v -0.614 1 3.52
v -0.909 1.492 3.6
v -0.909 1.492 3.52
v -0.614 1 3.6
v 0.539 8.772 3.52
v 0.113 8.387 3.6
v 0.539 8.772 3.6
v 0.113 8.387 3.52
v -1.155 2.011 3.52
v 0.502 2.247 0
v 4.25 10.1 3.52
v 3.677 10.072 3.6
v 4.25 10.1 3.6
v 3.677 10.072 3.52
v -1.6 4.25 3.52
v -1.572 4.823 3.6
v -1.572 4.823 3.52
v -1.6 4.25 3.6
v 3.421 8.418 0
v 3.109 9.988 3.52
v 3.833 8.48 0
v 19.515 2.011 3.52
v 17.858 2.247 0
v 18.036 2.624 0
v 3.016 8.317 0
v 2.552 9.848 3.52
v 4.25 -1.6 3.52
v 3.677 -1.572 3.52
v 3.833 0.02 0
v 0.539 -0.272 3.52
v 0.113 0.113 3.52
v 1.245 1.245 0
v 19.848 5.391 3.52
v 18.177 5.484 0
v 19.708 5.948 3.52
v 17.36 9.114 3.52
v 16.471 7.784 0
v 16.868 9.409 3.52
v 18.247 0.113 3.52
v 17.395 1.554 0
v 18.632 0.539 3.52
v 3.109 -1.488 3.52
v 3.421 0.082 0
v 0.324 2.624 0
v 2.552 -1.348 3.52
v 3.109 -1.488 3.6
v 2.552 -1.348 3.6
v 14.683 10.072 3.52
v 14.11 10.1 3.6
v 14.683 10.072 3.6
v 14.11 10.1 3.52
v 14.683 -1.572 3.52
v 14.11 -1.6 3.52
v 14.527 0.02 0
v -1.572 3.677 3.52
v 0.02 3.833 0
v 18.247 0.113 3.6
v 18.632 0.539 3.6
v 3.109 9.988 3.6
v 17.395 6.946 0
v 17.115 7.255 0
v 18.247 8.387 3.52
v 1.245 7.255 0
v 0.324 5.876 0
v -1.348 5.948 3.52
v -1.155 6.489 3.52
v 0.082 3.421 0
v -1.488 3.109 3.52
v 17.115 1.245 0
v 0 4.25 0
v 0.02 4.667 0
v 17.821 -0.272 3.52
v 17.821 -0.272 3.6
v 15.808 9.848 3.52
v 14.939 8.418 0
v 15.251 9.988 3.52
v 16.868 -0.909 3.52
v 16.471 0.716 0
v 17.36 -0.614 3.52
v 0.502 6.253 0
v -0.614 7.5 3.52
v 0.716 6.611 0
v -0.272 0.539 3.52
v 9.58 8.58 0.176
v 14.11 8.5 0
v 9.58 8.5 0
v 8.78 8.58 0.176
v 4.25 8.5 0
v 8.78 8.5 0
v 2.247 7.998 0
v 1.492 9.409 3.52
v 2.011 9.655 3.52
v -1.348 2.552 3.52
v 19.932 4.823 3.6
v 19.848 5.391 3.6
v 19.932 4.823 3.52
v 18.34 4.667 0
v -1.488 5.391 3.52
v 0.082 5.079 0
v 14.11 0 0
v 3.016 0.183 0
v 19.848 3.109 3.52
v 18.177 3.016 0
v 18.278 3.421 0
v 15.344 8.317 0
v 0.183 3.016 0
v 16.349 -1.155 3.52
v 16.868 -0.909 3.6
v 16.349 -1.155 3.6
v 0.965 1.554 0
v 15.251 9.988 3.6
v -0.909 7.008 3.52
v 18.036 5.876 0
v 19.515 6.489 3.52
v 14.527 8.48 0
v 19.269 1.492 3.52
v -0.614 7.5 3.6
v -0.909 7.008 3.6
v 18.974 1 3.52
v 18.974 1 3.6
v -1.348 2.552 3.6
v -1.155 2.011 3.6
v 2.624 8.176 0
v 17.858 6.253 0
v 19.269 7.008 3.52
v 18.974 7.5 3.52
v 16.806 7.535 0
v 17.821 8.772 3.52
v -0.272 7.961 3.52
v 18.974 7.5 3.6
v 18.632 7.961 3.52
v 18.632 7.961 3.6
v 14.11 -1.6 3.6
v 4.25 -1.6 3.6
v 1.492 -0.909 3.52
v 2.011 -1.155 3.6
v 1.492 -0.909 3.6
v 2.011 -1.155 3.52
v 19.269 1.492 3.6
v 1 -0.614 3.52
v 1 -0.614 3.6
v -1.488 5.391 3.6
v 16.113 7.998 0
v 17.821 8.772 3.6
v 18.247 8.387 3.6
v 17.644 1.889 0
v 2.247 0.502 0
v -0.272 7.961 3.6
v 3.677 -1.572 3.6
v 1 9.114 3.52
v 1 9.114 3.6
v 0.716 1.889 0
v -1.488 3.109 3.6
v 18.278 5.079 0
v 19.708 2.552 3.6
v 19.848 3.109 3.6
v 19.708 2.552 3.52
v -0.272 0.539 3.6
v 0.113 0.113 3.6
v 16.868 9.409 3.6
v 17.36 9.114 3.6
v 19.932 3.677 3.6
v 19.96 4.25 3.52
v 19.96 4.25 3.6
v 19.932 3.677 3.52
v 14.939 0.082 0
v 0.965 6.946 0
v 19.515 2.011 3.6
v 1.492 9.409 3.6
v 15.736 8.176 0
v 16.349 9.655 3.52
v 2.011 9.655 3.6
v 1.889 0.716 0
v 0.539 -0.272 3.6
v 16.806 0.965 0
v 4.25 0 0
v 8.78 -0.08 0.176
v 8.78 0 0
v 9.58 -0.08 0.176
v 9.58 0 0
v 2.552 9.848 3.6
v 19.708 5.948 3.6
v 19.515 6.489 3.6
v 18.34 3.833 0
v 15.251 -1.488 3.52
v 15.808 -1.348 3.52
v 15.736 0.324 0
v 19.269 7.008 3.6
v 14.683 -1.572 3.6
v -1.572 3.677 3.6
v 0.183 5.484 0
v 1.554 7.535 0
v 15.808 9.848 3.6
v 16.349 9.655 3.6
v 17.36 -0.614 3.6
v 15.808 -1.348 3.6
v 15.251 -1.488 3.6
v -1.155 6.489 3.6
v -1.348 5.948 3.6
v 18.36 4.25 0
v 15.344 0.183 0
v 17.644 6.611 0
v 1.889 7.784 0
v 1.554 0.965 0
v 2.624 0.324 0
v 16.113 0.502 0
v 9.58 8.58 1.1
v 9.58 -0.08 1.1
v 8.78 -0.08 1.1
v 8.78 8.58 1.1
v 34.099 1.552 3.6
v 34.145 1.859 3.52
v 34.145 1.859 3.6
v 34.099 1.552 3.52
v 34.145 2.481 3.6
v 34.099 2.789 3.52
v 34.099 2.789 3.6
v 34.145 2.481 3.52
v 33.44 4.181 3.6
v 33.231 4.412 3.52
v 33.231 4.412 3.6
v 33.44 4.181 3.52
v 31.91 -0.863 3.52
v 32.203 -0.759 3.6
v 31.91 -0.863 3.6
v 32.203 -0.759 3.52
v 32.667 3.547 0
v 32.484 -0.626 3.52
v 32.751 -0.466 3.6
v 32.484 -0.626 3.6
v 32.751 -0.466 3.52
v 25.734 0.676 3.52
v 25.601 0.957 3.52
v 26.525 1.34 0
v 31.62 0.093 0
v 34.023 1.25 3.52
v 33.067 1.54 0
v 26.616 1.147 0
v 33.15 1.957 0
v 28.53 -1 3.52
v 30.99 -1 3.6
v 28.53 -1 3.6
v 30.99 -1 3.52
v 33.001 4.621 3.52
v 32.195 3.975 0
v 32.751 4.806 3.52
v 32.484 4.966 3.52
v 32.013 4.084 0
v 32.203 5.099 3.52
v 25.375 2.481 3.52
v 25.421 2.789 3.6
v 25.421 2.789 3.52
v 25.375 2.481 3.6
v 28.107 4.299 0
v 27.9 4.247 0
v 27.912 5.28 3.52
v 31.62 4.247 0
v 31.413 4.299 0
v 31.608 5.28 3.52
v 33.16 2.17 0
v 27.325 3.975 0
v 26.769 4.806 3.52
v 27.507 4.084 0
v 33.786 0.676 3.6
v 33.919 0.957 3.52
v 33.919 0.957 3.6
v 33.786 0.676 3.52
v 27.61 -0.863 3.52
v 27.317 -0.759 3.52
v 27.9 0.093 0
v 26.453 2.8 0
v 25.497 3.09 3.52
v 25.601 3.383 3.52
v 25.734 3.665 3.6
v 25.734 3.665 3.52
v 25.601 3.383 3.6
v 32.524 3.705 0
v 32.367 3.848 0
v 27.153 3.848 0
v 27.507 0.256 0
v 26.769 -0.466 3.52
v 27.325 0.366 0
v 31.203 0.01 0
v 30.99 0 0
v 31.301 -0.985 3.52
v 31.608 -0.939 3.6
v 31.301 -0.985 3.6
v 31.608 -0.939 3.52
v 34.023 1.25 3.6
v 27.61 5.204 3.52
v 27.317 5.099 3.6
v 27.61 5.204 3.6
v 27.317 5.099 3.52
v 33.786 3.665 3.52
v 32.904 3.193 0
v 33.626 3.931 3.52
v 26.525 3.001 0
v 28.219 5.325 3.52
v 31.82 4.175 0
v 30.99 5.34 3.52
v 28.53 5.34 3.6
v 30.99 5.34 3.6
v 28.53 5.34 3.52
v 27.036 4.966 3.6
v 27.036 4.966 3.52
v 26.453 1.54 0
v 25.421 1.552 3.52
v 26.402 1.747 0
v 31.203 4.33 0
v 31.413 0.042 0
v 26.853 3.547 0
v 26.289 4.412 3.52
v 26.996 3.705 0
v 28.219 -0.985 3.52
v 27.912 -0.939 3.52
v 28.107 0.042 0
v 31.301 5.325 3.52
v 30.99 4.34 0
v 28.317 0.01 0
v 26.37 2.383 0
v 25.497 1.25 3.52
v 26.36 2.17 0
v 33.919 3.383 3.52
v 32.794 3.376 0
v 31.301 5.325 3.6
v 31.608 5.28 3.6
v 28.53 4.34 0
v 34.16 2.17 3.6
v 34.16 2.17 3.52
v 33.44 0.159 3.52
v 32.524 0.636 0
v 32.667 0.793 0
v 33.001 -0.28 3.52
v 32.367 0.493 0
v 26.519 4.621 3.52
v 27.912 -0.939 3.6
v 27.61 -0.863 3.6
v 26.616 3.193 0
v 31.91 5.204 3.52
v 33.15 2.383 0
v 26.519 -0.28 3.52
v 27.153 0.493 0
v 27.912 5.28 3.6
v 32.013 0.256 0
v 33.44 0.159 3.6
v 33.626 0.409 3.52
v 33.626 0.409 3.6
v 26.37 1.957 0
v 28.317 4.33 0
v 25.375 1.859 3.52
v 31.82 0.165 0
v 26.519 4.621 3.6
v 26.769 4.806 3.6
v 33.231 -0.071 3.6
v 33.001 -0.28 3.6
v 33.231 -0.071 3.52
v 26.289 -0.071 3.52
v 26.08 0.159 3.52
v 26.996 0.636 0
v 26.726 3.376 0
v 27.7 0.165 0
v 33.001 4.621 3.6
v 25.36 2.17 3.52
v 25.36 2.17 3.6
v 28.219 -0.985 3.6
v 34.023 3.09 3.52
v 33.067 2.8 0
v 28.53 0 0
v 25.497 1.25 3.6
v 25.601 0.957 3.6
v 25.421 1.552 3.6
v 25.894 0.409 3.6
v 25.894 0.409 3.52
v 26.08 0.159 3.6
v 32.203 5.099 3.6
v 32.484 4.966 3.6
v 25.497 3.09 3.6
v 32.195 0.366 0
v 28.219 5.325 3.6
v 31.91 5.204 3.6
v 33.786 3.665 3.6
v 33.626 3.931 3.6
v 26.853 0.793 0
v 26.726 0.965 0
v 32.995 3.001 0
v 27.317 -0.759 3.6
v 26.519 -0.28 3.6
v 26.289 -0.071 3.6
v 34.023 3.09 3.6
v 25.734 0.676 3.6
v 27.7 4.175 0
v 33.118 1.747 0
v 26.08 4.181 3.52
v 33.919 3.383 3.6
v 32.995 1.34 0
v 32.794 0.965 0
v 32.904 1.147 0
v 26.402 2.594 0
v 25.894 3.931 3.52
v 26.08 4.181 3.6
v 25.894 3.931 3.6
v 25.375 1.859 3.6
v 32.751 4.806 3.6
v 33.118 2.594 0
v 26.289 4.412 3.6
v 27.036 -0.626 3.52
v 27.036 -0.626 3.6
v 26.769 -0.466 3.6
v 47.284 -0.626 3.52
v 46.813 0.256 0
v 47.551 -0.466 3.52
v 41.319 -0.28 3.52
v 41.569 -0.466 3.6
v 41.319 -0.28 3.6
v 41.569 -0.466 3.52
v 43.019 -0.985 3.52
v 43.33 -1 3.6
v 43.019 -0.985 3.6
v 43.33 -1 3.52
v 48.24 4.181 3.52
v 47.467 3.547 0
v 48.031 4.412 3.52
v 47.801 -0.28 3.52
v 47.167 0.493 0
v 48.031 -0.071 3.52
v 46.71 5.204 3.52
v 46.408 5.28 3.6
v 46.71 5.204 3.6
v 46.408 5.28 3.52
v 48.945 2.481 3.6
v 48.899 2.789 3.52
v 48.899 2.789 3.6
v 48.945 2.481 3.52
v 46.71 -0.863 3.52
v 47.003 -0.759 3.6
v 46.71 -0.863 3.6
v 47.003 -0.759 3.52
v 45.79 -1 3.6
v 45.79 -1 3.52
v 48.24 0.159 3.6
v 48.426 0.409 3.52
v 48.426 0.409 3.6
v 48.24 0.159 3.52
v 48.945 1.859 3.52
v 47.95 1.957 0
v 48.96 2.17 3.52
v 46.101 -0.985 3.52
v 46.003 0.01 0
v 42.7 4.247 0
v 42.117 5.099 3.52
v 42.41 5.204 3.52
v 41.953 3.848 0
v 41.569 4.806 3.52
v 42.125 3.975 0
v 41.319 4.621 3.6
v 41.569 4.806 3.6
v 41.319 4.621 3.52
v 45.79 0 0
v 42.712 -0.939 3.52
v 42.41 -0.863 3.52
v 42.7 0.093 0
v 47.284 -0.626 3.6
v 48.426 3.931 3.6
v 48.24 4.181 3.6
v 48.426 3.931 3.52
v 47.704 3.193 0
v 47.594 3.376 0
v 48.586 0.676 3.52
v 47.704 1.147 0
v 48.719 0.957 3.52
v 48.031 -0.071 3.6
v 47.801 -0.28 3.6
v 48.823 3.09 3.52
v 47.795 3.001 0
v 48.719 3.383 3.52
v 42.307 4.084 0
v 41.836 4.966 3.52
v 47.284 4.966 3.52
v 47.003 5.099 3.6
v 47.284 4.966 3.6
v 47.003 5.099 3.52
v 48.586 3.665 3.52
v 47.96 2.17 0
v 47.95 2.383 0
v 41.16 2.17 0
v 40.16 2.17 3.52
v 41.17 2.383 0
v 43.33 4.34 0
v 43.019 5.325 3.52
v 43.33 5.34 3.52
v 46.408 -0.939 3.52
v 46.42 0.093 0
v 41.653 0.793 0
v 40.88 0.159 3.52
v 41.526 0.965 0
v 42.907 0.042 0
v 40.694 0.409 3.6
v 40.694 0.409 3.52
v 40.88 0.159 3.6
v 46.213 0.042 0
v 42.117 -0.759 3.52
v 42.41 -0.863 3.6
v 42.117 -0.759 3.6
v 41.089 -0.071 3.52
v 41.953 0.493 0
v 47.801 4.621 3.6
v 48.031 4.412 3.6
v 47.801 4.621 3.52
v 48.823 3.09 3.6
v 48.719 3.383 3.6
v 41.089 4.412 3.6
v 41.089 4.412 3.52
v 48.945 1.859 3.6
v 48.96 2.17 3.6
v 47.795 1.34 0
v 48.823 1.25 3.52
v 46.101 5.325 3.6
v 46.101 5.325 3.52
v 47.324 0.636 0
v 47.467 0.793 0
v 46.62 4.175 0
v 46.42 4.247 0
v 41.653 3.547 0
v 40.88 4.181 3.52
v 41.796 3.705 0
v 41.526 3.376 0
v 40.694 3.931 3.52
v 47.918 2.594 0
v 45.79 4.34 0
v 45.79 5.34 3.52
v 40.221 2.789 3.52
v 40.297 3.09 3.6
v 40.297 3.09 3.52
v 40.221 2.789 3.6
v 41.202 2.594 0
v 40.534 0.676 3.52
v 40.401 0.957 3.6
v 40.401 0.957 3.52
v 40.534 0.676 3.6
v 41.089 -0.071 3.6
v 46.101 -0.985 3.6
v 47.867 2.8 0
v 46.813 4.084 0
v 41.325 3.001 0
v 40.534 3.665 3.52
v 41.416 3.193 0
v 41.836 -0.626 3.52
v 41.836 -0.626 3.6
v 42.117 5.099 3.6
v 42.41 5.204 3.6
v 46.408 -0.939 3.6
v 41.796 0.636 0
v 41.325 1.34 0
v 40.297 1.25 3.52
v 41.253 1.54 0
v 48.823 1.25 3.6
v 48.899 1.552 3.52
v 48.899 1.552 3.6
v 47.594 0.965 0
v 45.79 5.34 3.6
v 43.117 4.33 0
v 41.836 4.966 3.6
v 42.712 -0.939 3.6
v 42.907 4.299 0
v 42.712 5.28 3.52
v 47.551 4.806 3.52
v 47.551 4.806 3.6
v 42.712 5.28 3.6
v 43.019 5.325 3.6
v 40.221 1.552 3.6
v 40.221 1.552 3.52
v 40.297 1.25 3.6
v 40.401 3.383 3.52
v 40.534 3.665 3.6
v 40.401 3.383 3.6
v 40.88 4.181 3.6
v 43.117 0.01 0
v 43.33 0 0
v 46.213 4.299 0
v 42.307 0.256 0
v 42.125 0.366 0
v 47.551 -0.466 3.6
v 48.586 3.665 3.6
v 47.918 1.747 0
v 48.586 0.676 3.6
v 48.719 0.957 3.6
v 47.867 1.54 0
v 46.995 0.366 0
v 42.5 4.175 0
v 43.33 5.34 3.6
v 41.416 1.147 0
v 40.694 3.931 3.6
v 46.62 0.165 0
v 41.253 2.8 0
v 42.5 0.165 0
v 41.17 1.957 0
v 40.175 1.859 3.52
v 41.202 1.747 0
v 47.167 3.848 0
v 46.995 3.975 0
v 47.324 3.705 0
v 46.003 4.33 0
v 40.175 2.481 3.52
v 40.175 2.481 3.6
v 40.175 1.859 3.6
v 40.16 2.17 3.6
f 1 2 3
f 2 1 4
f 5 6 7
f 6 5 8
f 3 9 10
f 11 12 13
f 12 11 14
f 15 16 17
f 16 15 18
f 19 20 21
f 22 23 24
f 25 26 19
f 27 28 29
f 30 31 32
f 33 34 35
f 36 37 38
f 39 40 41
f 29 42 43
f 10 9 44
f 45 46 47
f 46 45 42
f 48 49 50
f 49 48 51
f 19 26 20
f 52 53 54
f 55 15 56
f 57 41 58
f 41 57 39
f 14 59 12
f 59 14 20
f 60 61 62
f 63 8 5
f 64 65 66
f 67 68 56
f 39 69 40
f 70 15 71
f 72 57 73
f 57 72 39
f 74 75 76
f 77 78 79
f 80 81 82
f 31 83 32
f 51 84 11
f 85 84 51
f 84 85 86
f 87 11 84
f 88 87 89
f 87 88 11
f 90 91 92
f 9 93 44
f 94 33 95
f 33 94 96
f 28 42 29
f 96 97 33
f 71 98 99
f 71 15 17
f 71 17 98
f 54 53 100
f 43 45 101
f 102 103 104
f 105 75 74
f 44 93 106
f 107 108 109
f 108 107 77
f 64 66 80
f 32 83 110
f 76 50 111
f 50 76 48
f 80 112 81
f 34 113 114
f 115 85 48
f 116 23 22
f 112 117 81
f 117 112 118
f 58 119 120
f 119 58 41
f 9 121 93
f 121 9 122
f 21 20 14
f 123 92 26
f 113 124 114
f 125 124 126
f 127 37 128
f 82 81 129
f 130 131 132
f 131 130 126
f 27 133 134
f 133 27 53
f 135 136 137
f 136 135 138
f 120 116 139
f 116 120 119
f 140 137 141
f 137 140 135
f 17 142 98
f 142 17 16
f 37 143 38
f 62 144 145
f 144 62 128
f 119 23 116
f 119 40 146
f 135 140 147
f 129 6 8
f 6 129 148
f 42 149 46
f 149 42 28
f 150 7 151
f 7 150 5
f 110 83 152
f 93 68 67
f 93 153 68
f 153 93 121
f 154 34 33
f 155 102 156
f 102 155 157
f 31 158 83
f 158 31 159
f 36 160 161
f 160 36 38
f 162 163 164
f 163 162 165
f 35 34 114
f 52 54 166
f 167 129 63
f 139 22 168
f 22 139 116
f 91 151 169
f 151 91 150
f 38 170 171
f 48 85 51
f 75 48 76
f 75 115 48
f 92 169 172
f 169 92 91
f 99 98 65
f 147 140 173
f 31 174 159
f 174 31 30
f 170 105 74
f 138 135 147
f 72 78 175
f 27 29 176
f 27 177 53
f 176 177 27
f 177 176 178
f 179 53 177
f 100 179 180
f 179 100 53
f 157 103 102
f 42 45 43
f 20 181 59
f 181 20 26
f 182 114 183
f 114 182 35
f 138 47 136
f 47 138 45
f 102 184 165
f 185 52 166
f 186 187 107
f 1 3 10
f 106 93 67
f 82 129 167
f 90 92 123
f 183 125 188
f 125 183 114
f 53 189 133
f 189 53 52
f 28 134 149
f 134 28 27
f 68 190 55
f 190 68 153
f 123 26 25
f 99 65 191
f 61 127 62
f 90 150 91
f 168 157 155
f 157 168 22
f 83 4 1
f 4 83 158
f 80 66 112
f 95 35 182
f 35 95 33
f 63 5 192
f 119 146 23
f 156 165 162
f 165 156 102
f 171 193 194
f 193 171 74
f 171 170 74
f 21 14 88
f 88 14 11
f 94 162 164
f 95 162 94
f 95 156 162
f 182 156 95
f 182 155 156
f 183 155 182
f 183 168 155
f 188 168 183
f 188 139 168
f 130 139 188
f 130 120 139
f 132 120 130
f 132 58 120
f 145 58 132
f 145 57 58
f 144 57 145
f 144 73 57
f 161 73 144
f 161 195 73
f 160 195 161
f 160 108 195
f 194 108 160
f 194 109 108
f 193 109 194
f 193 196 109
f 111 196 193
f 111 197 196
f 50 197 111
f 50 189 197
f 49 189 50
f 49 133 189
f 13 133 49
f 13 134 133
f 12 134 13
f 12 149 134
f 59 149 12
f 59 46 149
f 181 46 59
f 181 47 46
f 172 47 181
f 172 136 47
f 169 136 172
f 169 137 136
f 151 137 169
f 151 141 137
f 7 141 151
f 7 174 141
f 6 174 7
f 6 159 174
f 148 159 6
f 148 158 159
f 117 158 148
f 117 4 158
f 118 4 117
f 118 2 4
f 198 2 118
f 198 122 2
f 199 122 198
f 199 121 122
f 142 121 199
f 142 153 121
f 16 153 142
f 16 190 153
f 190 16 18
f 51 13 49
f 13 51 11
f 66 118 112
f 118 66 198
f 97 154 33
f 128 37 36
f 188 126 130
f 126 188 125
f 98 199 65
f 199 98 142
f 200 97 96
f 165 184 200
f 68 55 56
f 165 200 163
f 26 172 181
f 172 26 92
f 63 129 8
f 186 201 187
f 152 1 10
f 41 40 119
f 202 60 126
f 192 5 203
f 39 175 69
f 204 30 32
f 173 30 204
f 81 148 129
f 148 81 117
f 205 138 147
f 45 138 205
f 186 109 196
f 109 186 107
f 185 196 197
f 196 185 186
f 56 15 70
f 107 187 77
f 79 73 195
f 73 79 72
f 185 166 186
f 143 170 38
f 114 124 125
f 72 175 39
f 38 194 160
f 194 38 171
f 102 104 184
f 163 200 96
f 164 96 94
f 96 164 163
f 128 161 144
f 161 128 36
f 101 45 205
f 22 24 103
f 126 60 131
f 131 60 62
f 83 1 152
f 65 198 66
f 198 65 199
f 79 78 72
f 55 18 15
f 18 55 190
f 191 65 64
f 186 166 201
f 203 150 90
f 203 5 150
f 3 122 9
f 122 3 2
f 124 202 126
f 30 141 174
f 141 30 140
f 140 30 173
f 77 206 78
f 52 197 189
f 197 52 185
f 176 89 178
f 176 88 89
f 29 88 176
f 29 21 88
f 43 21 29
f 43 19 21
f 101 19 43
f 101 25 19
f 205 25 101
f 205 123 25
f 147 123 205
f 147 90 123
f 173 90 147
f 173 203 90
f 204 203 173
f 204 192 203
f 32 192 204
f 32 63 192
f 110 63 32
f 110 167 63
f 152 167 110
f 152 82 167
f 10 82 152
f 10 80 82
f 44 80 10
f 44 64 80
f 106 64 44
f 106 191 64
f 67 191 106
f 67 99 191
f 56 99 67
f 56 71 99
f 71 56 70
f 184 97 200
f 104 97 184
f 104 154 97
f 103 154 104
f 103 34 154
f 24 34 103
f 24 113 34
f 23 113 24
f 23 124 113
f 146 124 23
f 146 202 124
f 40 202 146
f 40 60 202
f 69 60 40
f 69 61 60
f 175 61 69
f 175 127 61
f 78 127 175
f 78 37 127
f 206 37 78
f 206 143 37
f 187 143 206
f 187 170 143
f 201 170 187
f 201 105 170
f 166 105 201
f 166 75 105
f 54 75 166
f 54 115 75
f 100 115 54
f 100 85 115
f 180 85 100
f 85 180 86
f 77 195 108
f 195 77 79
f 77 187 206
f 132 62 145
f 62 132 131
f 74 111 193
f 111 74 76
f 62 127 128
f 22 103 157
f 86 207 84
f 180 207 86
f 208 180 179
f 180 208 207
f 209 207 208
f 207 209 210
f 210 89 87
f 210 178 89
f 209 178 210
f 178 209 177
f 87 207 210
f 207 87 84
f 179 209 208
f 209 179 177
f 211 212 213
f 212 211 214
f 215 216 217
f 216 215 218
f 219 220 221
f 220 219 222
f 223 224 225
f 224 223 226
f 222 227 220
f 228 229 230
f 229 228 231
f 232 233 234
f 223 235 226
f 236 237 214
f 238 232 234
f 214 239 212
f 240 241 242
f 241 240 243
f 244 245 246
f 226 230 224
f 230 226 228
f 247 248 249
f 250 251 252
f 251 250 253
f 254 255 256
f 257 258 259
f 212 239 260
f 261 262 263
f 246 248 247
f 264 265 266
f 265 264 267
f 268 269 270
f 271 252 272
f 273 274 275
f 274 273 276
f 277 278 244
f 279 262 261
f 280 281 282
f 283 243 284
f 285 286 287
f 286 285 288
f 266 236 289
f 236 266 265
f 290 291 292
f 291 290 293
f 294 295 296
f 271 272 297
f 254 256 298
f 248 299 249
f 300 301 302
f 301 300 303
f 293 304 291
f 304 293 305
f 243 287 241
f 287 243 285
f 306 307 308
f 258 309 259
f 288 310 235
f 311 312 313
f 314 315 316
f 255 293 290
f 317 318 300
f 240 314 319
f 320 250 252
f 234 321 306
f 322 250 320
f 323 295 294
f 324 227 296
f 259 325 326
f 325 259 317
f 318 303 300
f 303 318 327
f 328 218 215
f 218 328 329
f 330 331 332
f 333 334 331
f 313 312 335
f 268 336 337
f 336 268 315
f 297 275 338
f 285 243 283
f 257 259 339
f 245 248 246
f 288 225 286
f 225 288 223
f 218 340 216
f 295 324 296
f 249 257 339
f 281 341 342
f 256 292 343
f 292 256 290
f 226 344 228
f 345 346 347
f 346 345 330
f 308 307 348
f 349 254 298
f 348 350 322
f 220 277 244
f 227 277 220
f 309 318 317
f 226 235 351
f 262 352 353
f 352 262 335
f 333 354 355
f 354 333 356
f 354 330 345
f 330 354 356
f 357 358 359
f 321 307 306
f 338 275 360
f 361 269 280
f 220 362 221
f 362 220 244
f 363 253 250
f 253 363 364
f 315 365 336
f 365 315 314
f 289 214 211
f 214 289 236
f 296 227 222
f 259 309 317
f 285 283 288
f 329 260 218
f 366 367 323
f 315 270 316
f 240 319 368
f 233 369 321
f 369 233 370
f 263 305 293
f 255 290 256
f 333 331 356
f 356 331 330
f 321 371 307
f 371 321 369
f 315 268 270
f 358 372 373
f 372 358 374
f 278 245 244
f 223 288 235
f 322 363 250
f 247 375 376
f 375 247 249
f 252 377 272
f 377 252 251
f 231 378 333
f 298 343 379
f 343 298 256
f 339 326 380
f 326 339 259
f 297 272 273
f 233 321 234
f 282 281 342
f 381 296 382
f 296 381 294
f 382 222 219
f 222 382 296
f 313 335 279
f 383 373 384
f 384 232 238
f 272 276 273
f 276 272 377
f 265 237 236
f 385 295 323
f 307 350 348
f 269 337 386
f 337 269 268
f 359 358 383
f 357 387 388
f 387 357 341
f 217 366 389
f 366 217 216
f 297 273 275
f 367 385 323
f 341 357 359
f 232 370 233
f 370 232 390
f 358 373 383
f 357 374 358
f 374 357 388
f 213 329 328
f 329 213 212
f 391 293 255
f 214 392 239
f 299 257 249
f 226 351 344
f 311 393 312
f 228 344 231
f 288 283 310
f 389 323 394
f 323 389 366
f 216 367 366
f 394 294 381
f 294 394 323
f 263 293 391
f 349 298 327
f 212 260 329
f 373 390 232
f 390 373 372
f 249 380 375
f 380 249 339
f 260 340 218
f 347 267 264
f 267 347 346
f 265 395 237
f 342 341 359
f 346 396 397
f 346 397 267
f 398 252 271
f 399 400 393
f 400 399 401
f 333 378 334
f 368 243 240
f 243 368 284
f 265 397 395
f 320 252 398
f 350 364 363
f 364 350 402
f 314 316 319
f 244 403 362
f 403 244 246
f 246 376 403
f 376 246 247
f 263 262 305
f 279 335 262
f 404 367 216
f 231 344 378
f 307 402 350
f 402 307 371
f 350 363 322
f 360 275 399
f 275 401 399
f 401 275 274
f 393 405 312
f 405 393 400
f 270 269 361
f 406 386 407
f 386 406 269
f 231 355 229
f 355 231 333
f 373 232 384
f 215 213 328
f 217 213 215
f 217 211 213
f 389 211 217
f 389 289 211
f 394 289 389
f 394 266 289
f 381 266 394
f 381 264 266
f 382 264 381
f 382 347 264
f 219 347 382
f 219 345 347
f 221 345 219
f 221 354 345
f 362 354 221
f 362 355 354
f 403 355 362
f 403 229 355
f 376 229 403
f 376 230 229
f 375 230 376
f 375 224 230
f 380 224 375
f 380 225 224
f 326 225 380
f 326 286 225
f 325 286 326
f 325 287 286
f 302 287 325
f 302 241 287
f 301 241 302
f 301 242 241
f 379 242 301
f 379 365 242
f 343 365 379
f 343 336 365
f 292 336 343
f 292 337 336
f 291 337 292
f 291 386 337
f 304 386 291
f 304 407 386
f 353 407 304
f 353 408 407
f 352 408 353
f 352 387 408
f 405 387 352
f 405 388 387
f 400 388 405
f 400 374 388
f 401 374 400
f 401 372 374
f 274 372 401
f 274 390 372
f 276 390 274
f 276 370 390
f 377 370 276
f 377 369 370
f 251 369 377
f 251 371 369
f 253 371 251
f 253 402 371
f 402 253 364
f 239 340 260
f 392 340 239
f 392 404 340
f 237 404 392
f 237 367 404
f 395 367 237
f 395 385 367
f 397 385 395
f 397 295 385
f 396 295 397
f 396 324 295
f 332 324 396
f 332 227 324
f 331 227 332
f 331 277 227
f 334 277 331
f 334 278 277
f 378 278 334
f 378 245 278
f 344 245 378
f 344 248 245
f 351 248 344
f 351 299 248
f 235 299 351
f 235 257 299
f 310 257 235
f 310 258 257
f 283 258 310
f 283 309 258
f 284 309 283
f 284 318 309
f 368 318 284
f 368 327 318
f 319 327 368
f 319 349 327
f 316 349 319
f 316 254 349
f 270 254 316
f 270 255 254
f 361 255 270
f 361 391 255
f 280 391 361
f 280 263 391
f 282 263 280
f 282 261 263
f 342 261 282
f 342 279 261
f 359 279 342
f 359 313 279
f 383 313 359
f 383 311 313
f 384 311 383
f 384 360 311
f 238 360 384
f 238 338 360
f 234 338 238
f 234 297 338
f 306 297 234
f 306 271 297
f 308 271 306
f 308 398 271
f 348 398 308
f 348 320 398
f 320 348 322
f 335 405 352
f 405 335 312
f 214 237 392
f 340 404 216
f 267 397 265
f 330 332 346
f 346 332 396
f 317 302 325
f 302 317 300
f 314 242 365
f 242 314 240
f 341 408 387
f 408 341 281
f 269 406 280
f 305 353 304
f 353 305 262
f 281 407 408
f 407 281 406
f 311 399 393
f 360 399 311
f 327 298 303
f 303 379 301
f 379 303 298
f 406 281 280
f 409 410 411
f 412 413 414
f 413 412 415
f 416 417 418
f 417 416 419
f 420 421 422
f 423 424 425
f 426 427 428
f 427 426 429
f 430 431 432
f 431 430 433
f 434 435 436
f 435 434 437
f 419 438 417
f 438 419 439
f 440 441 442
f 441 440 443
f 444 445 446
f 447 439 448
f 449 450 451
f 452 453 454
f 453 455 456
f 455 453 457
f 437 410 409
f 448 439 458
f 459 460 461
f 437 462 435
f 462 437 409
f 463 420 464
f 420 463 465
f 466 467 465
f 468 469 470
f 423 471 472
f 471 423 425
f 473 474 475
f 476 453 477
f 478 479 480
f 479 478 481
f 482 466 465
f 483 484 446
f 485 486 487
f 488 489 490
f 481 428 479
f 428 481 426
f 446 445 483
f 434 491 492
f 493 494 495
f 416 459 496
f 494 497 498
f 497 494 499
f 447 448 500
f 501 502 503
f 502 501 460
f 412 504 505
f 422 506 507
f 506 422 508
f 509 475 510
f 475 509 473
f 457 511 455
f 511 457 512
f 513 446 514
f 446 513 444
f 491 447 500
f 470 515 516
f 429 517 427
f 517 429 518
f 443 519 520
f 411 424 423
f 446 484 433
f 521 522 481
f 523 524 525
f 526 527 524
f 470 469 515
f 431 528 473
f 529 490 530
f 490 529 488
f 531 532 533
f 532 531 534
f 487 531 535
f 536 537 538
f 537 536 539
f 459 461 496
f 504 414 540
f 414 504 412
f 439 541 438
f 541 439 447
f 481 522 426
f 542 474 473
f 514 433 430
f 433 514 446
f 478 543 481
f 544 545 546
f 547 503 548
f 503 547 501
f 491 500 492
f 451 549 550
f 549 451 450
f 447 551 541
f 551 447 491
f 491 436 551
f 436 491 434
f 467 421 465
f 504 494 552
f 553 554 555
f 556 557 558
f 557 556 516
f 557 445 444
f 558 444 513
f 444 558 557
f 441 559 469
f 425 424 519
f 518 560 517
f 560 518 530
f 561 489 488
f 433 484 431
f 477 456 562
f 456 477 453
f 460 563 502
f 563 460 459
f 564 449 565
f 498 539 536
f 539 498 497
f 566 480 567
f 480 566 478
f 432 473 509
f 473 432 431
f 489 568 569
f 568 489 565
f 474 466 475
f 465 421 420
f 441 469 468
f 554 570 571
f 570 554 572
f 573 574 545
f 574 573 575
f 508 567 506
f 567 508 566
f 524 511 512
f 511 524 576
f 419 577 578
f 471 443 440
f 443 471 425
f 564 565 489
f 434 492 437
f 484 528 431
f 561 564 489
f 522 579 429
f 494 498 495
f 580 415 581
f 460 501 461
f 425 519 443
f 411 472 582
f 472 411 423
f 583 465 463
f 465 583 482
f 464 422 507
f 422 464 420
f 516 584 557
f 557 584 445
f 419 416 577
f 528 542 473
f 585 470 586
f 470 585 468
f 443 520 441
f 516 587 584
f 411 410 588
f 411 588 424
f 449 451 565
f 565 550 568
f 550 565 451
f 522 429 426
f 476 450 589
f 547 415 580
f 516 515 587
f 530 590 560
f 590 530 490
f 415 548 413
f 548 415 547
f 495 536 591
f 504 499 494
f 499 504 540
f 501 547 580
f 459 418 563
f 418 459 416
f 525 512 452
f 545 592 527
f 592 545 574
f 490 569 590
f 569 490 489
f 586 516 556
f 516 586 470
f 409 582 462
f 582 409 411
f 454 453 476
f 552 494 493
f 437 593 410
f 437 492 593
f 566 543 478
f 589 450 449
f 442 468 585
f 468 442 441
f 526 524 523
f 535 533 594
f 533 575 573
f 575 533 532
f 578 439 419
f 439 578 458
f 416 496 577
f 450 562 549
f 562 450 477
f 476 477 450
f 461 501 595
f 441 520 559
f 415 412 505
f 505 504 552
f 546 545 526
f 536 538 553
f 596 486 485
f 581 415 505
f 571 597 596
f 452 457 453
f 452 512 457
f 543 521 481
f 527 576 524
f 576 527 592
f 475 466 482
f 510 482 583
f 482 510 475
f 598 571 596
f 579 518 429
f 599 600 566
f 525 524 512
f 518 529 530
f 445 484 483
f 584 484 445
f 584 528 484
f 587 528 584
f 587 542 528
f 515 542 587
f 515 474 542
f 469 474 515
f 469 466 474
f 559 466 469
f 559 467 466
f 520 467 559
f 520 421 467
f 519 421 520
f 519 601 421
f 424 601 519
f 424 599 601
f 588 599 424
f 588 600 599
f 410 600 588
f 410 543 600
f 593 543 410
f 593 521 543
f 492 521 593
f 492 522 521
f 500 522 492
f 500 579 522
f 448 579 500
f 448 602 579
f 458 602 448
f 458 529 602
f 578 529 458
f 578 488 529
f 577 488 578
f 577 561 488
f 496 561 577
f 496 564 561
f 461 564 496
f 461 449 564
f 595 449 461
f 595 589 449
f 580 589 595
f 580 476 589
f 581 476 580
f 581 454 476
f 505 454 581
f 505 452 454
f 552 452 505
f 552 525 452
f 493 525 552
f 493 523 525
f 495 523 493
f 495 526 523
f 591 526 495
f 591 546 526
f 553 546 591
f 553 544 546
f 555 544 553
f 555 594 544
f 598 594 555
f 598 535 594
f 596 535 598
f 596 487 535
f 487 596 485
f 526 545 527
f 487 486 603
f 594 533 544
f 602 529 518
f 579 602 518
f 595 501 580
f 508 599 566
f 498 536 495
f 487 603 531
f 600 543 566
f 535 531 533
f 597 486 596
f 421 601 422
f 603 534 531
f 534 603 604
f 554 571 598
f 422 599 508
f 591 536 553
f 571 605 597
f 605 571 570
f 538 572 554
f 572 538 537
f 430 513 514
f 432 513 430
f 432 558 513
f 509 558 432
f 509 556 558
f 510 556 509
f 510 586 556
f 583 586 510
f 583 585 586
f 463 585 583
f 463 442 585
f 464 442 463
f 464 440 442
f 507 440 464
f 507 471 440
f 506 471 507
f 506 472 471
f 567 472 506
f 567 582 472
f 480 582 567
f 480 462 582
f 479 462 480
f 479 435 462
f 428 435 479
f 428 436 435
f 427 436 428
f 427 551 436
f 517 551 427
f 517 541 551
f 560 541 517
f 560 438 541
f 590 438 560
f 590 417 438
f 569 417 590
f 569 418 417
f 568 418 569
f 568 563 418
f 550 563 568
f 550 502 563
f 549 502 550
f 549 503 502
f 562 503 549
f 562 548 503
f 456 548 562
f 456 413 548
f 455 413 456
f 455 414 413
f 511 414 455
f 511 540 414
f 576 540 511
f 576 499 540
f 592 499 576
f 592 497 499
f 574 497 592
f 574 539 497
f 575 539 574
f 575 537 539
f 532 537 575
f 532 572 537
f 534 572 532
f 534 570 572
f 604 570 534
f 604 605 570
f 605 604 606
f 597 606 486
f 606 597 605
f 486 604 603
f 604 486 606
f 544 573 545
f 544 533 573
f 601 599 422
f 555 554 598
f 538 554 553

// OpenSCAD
// file: face_lock.scad
// AP1 face lock — generated by src/face_spec.py. Do not edit; edit the spec.
style = "ap1";
module_aspect = 2.35;
tach_cx = 0.5;
tach_cy_h = 1.3;
tach_r_out = 0.543;
tach_r_in = 0.51;
tach_r_line = 0.506;
tach_r_num = 0.476;
tach_num_size = 0.034;
tach_a0 = -127.8;
tach_a9 = -52.2;
tach_hatch_deg = 5.5;
crown_cy_h = 1.1926249999999998;
crown_r = 0.5035;
crown_lip = 0.02;
spring_y_h = 0.58;
speed_win = [0.39, 0.3, 0.22, 0.24];
odo_win = [0.39, 0.57, 0.22, 0.13];
temp_win = [0.13, 0.52, 0.16, 0.055];
temp_icon = [0.15, 0.478];
temp_c = [0.108, 0.548];
temp_h = [0.312, 0.548];
temp_underline_y = 0.59;
fuel_win = [0.815, 0.465, 0.11, 0.045];
fuel_icon = [0.905, 0.425];
fuel_e = [0.797, 0.49];
fuel_f = [0.943, 0.49];
fuel_underline_y = 0.525;
side_gauges_arched = false;
arc_lamps = [[0.35, 0.34, 0.022], [0.65, 0.34, 0.022], [0.712, 0.42, 0.02]];
arc_lamp_r = 0.0185;
strip = [0.155, 0.745, 0.75, 0.14];
strip_lamps = [[0.19, 0.815, 0.03], [0.262, 0.815, 0.022], [0.322, 0.815, 0.024], [0.388, 0.815, 0.024], [0.462, 0.815, 0.02], [0.545, 0.815, 0.02], [0.635, 0.815, 0.02], [0.715, 0.815, 0.02], [0.8, 0.815, 0.03]];
panel_left = [0.06, 0.615, 0.185, 0.09];
panel_right = [0.79, 0.59, 0.145, 0.09];
btn_minus = [0.06, 0.815];
btn_plus = [0.118, 0.815];
btn_d = 0.05;
btn_sel = [0.935, 0.745];
btn_trip = [0.978, 0.745];
oval_w = 0.04;
oval_h = 0.06;
cancel_icon = [0.157, 0.935];
cancel_text = [0.172, 0.935];
units_label = [0.9, 0.862];
// file: dims.scad
// =============================================================================
// Dimensions — Option 1 replace-face stack (arc lock)
// =============================================================================
// Face geometry comes from face_lock.scad, generated by src/face_spec.py from
// the same numbers that drive pygame and the web harness. Edit the Python
// spec, re-run `uv run python src/face_spec.py`, never this file's lock values.
//
// Millimetre sizes are ESTIMATED (170 × 72.3, 2.35:1 from
// refs/flat/DIMENSIONS.md). Callipers are UNKNOWN. Every stack thickness is a
// PLACEHOLDER. This is NOT a verified AP1 drop-in.
//
// Origin (OpenSCAD): bottom-left of the module bounding box, Z toward driver.
// The lock uses top-left fractions — convert with X() / Y() / W() / H().
// =============================================================================

include <face_lock.scad>

$fn = 64;
eps = 0.08;

// --- module envelope (ESTIMATED mm) -----------------------------------------
face_w = 170.0;                     // ESTIMATED — TODO measure OEM face width
face_h = face_w / module_aspect;    // 72.3 — TODO measure height

// --- fraction → mm helpers ---------------------------------------------------
function W(f) = f * face_w;                  // width fraction → mm
function H(f) = f * face_h;                  // height fraction → mm
function X(f) = f * face_w;                  // x from the left
function Y(f) = face_h - f * face_h;         // y measured from the TOP → y-up
function Yw(yw) = face_h - yw * face_w;      // width-unit y (arc maths) → y-up
function h_to_w(f) = f / module_aspect;      // height fraction → width units
function rect_mm(r) = [X(r[0]), Y(r[1] + r[3]), W(r[2]), H(r[3])];   // [x, y, w, h] y-up
function pt_mm(a) = [X(a[0]), Y(a[1])];

// Tach / crown circles in mm (y-up). Angles stay screen-space in the lock
// (0° = +x, positive = clockwise on screen) → negate for y-up.
tach_c = [W(tach_cx), Yw(h_to_w(tach_cy_h))];
crown_c = [W(tach_cx), Yw(h_to_w(crown_cy_h))];
function on_circle(c, r_mm, deg_screen) = [c[0] + r_mm * cos(-deg_screen), c[1] + r_mm * sin(-deg_screen)];
function tach_pt(r_frac, deg) = on_circle(tach_c, W(r_frac), deg);
function crown_pt(r_frac, deg) = on_circle(crown_c, W(r_frac), deg);

spring_y = Y(spring_y_h);
// Where the crown circle (radius r, width units) meets the spring line — half-chord in mm.
function crown_half(r_frac) =
    let (dy = crown_c[1] - spring_y)
    sqrt(max(0, W(r_frac) * W(r_frac) - dy * dy));

arc_steps = 72;

// Display windows in the mask, as margins around the lock geometry (mm).
tach_win_margin = 1.2;              // beyond r_out / inside r_num, and past the hatches
tach_win_num_depth = W(0.030);      // window reaches this far inside the numeral radius
min_rim = 1.8;                      // mask rim kept around every window
lcd_win_r = 1.0;                    // corner radius on the LCD windows
gauge_pad = 1.6;                    // TEMP / FUEL window grows to include icon + letters
strip_pad = 0.8;
arc_lamp_hole_clear = 0.25;

// --- 7" panel pocket (Wisecoco-class 16:9 AMOLED; PLACEHOLDER) ---------------
// Active area is centred on the module. It is TALLER than the face (87 > 72.3)
// and NARROWER (154 < 170): every display window sits inside it, the hardware
// buttons at both ends sit over the panel's dead border. Verify against the
// real panel drawing before printing — every number here is a guess.
panel_w = 164.0;                    // PLACEHOLDER module outline
panel_h = 100.0;
panel_t = 2.6;                      // PLACEHOLDER glass + PCB + stiffener
panel_active_w = 154.0;             // PLACEHOLDER
panel_active_h = 87.0;
panel_clear = 0.3;                  // slip around the module
panel_c = [face_w / 2, face_h / 2];
panel_tail_w = 30.0;                // FPC exit — LOCATION UNKNOWN (bottom centre guess)
panel_tail_h = 3.0;

// --- stack thicknesses (ALL PLACEHOLDER / TODO measure) ---------------------
face_t = 2.0;                       // acrylic / printed mask
tray_h = 12.0;                      // overall tray
floor_t = 1.6;                      // tray floor
wall = 2.0;                         // tray wall
face_pocket_clear = 0.35;           // slip around the dropped-in face
diffuser_t = 0.0;                   // AMOLED — no diffuser sheet in this stack
cable_w = 16.0;                     // driver-board cable escape — LOCATION UNKNOWN
cable_h = 4.0;

align_hole_d = 2.3;                 // PLACEHOLDER — do not drill the bay from this

button_clear = 0.40;                // PLACEHOLDER hole oversize
button_cap_t = 2.4;                 // proud cap
button_flange_t = 1.2;              // retention flange
button_flange_extra = 1.6;          // radial flange beyond cap
rocker_groove_w = 0.80;
rocker_groove_d = 1.10;
stem_well_d = 6.0;                  // switch well in the tray — switch UNKNOWN
stem_well_h = 7.0;

// --- derived -----------------------------------------------------------------
web_t = 1.0;                        // baffle web between panel glass and mask
face_rebate_z = tray_h - face_t;
panel_z = face_rebate_z - panel_t - web_t;   // panel glass sits under the web
panel_rect = [panel_c[0] - panel_w / 2, panel_c[1] - panel_h / 2, panel_w, panel_h];
active_rect = [panel_c[0] - panel_active_w / 2, panel_c[1] - panel_active_h / 2, panel_active_w, panel_active_h];

btn_d_mm = W(btn_d);
btn_minus_c = pt_mm(btn_minus);
btn_plus_c = pt_mm(btn_plus);
btn_sel_c = pt_mm(btn_sel);
btn_trip_c = pt_mm(btn_trip);
oval_w_mm = W(oval_w);
oval_h_mm = H(oval_h);
rocker_w = btn_plus_c[0] - btn_minus_c[0] + btn_d_mm;   // −/+ pair as one rocker cap
rocker_h = btn_d_mm;
// file: outline.scad
// =============================================================================
// 2D OEM silhouette + window helpers (replace-face, arc lock)
// =============================================================================
// Same maths as src/face_spec.py / gauge_ui.py hood_outer_points(): the hood
// is a circular crown (crown_c, crown_r) springing from a flat lower bezel;
// the tach is a bar graph on a true circular arc (tach_c, r_out .. r_in).
// All millimetre sizes are still ESTIMATED — see dims.scad.
// =============================================================================

include <dims.scad>

// Points along a circle (mm) between two screen angles.
function arc_pts(c, r_mm, deg0, deg1, n = arc_steps) =
    [for (i = [0 : n]) on_circle(c, r_mm, deg0 + (deg1 - deg0) * i / n)];

// Screen angles where a crown circle of radius r meets the spring line
// (right spring first, sweeping over the top to the left).
function crown_angles(r_frac) =
    let (
        half = crown_half(r_frac),
        dy = crown_c[1] - spring_y             // screen-space dy (spring above centre → negative)
    )
    [atan2(dy, half), atan2(dy, -half)];

// Crown arc in mm from the right spring, over the peak, to the left spring.
function crown_arc(r_frac) =
    let (a = crown_angles(r_frac)) arc_pts(crown_c, W(r_frac), a[0], a[1]);

// Counter-clockwise from bottom-left: flat bottom, up the right side to the
// spring, over the hood crown (crown + lip), down the left side.
function hood_points() =
    let (arc = crown_arc(crown_r + crown_lip))
    concat(
        [[0, 0], [face_w, 0], [face_w, spring_y], arc[0]],
        arc,
        [arc[len(arc) - 1], [0, spring_y]]
    );

// Black face aperture: crown inner edge over the top, full width (minus the
// lip) below the spring.
function aperture_points() =
    let (arc = crown_arc(crown_r), lip = W(crown_lip))
    concat(
        [[face_w - lip, lip], [face_w - lip, spring_y], arc[0]],
        arc,
        [arc[len(arc) - 1], [lip, spring_y], [lip, lip]]
    );

module hood_2d() { polygon(hood_points()); }
module aperture_2d() { polygon(aperture_points()); }

module stadium_2d(w, h) {
    r = min(w, h) / 2;
    hull() {
        translate([r, r]) circle(r = r);
        translate([w - r, r]) circle(r = r);
        translate([r, h - r]) circle(r = r);
        translate([w - r, h - r]) circle(r = r);
    }
}

module rounded_rect_2d(w, h, r) {
    rr = min(r, w / 2, h / 2);
    hull() {
        translate([rr, rr]) circle(r = rr);
        translate([w - rr, rr]) circle(r = rr);
        translate([rr, h - rr]) circle(r = rr);
        translate([w - rr, h - rr]) circle(r = rr);
    }
}

module rect_mm_2d(r, radius = 0) {
    m = rect_mm(r);
    translate([m[0], m[1]]) rounded_rect_2d(m[2], m[3], radius);
}

// Annular sector between two radii (fractions of module width) and two
// screen angles — the display shows the band, ticks and numerals through it.
module sector_2d(r_hi, r_lo, deg0, deg1) {
    outer = arc_pts(tach_c, W(r_hi), deg0, deg1);
    inner = arc_pts(tach_c, W(r_lo), deg1, deg0);
    polygon(concat(outer, inner));
}

// One window from just outside the band's outer edge to just inside the
// numerals, spanning the hatch overrun past 0 and 9.
module tach_window_2d() {
    margin = tach_win_margin / face_w;
    over = tach_hatch_deg + 1.5;
    sector_2d(
        tach_r_out + margin,
        tach_r_num - tach_win_num_depth / face_w,
        tach_a0 - over,
        tach_a9 + over
    );
}

module speed_window_2d() { rect_mm_2d(speed_win, lcd_win_r); }
module odo_window_2d() { rect_mm_2d(odo_win, lcd_win_r); }

// TEMP / FUEL windows include the icon above and the C/H or E/F letters.
module temp_window_2d() {
    icon = pt_mm(temp_icon);
    c = pt_mm(temp_c);
    h = pt_mm(temp_h);
    top = icon[1] + W(0.016);
    bot = Y(temp_underline_y) - gauge_pad;
    x0 = c[0] - W(0.012) - gauge_pad;
    x1 = h[0] + W(0.012) + gauge_pad;
    translate([x0, bot]) rounded_rect_2d(x1 - x0, top - bot, 1.2);
}

module fuel_window_2d() {
    icon = pt_mm(fuel_icon);
    e = pt_mm(fuel_e);
    f = pt_mm(fuel_f);
    top = icon[1] + W(0.015);
    bot = Y(fuel_underline_y) - gauge_pad;
    x0 = e[0] - W(0.012) - gauge_pad;
    x1 = f[0] + W(0.012) + gauge_pad;
    translate([x0, bot]) rounded_rect_2d(x1 - x0, top - bot, 1.2);
}

module arc_lamp_holes_2d(clear = arc_lamp_hole_clear) {
    for (l = arc_lamps)
        translate(pt_mm(l)) circle(r = W(arc_lamp_r) + clear);
}

module strip_window_2d(pad = strip_pad) {
    m = rect_mm(strip);
    translate([m[0] - pad, m[1] - pad]) rounded_rect_2d(m[2] + 2 * pad, m[3] + 2 * pad, 2.0);
}

module panel_windows_2d() {
    if (len(panel_left) == 4) rect_mm_2d(panel_left, 1.0);
    if (len(panel_right) == 4) rect_mm_2d(panel_right, 1.0);
}

// Every window is clipped to the hood inset by min_rim so the mask keeps a
// printable / laser-safe rim where the band runs under the crown lip.
module display_windows_2d() {
    intersection() {
        union() {
            tach_window_2d();
            speed_window_2d();
            odo_window_2d();
            temp_window_2d();
            fuel_window_2d();
            arc_lamp_holes_2d();
            strip_window_2d();
            panel_windows_2d();
        }
        offset(delta = -min_rim) hood_2d();
    }
}

// --- hardware -------------------------------------------------------------------
module rocker_2d(extra = 0) {
    translate([btn_minus_c[0] - btn_d_mm / 2 - extra, btn_minus_c[1] - btn_d_mm / 2 - extra])
        stadium_2d(rocker_w + 2 * extra, rocker_h + 2 * extra);
}

module oval_2d(c, extra = 0) {
    translate([c[0] - oval_w_mm / 2 - extra, c[1] - oval_h_mm / 2 - extra])
        stadium_2d(oval_w_mm + 2 * extra, oval_h_mm + 2 * extra);
}

module button_caps_2d(extra = 0) {
    rocker_2d(extra);
    oval_2d(btn_sel_c, extra);
    oval_2d(btn_trip_c, extra);
}

function stem_xy() = [btn_minus_c, btn_plus_c, btn_sel_c, btn_trip_c];

// Four PLACEHOLDER alignment pins in the lower bezel corners — fiction until measured.
function align_xy() = [
    [W(0.035), 3.0],
    [face_w - W(0.035), 3.0],
    [W(0.035), spring_y - 3.0],
    [face_w - W(0.035), spring_y - 3.0]
];

module align_holes_2d(d = align_hole_d) {
    for (p = align_xy()) translate(p) circle(d = d);
}

// --- panel pocket --------------------------------------------------------------------
module panel_pocket_2d(clear = panel_clear) {
    translate([panel_rect[0] - clear, panel_rect[1] - clear])
        rounded_rect_2d(panel_rect[2] + 2 * clear, panel_rect[3] + 2 * clear, 1.5);
}

module active_area_2d() {
    translate([active_rect[0], active_rect[1]]) square([active_rect[2], active_rect[3]]);
}

function point_in_rect(p, r) =
    p[0] >= r[0] && p[0] <= r[0] + r[2] && p[1] >= r[1] && p[1] <= r[1] + r[3];
// file: parts.scad
// =============================================================================
// 3D printable modules — Option 1 replace-face stack (arc lock)
// =============================================================================
// One module = one solid. The stack, front to rear:
//   rubber buttons → acrylic mask (display windows) → 7" AMOLED in the tray
//   pocket → tray floor. Callipers UNKNOWN. Not a verified AP1 drop-in.
//
// Cabin-facing hard parts: PETG or ASA. Do NOT use PLA in the cabin.
// Buttons: TPU 95A or cast silicone — not OEM rubber.
// =============================================================================

include <outline.scad>

module _through(h) {
    translate([0, 0, -eps])
        linear_extrude(h + 2 * eps)
            children();
}

// Tray outline: the hood silhouette plus the panel envelope (the 7" module is
// taller than the face, so the tray grows behind the hood to hold it).
module _tray_2d() {
    offset(delta = wall) {
        hood_2d();
        panel_pocket_2d();
    }
}

module backlight() {
    // Tray shell — one difference. The outer rim is a print wall, NOT a
    // measured bay clip and NOT a claimed AP1 fit.
    difference() {
        linear_extrude(tray_h)
            _tray_2d();

        // Face rebate: the mask drops in flush with the tray top.
        translate([0, 0, face_rebate_z])
            linear_extrude(face_t + 1)
                offset(delta = face_pocket_clear)
                    hood_2d();

        // 7" panel pocket, glass toward the mask.
        translate([0, 0, panel_z])
            linear_extrude(face_rebate_z - panel_z + eps)
                panel_pocket_2d();

        // Cavity under the panel for the driver board / cables.
        translate([0, 0, floor_t])
            linear_extrude(panel_z - floor_t + eps)
                offset(delta = -wall)
                    panel_pocket_2d();

        // Switch wells — only where they miss the panel; switch model UNKNOWN.
        for (p = stem_xy())
            if (!point_in_rect(p, panel_rect))
                translate([p[0], p[1], -eps])
                    cylinder(h = stem_well_h + eps, d = stem_well_d);

        // Panel FPC tail — LOCATION UNKNOWN (bottom-centre guess).
        translate([panel_c[0] - panel_tail_w / 2, panel_rect[1] - wall - panel_clear - eps, panel_z - panel_tail_h])
            cube([panel_tail_w, wall + panel_clear + 2 * eps, panel_tail_h + panel_t]);

        // Driver-board cable escape — LOCATION UNKNOWN.
        translate([face_w / 2 - cable_w / 2, panel_rect[1] - wall - panel_clear - eps, floor_t])
            cube([cable_w, wall + panel_clear + 2 * eps, cable_h]);

        _through(tray_h)
            align_holes_2d();
    }
}

module _cowl_web_2d() {
    // Light-baffle web between the display windows. Sits on the panel glass
    // under the mask so adjacent windows do not bleed into each other.
    difference() {
        offset(delta = -0.45) aperture_2d();
        offset(delta = 0.35) display_windows_2d();
        button_caps_2d(1.2);
        align_holes_2d(align_hole_d + 0.8);
    }
}

module backlight_web() {
    // Separate baffle insert — one extrusion, same thickness as the mask gap.
    linear_extrude(web_t - 0.1)
        _cowl_web_2d();
}

module acrylic_face() {
    // Mask plate — through-windows only. The display shows the bar-graph tach,
    // numerals, LCD windows, side gauges and telltales through them; the
    // cowl, lower bezel, PUSH CANCEL and mph·km/h legends stay printed.
    difference() {
        linear_extrude(face_t) hood_2d();
        _through(face_t) display_windows_2d();
        _through(face_t) button_caps_2d(button_clear);
        _through(face_t) align_holes_2d();
    }
}

module _button_solid(w, h, flange_extra) {
    // Single hull: cap → flange. No stem (switch UNKNOWN — add after measure).
    hull() {
        linear_extrude(eps) stadium_2d(w, h);
        translate([0, 0, button_cap_t - eps])
            linear_extrude(eps) stadium_2d(w, h);
        translate([-flange_extra, -flange_extra, button_cap_t + button_flange_t - eps])
            linear_extrude(eps) stadium_2d(w + 2 * flange_extra, h + 2 * flange_extra);
    }
}

module rocker_button() {
    // −/+ pair as one rocker cap (push = CANCEL). Local origin bottom-left.
    difference() {
        _button_solid(rocker_w, rocker_h, button_flange_extra);
        translate([rocker_w / 2 - rocker_groove_w / 2, -eps, -eps])
            cube([rocker_groove_w, rocker_h + 2 * eps, rocker_groove_d + eps]);
    }
}

module oval_button() {
    _button_solid(oval_w_mm, oval_h_mm, min(button_flange_extra, 1.0));
}

module sel_button() { oval_button(); }
module trip_button() { oval_button(); }

module rubber_buttons_print() {
    // F5 plate preview only — do not export this as one STL.
    rocker_button();
    translate([rocker_w + 8, 0, 0]) sel_button();
    translate([rocker_w + 8 + oval_w_mm + 8, 0, 0]) trip_button();
}

module rubber_buttons_placed() {
    translate([0, 0, button_cap_t * 0.35])
        mirror([0, 0, 1]) {
            translate([btn_minus_c[0] - btn_d_mm / 2, btn_minus_c[1] - btn_d_mm / 2, 0]) rocker_button();
            translate([btn_sel_c[0] - oval_w_mm / 2, btn_sel_c[1] - oval_h_mm / 2, 0]) sel_button();
            translate([btn_trip_c[0] - oval_w_mm / 2, btn_trip_c[1] - oval_h_mm / 2, 0]) trip_button();
        }
}

module panel_placeholder() {
    // F5 preview only — the bought 7" module, not a printable.
    translate([panel_rect[0], panel_rect[1], 0])
        cube([panel_rect[2], panel_rect[3], panel_t]);
    color([0.05, 0.05, 0.06])
        translate([active_rect[0], active_rect[1], panel_t])
            cube([active_rect[2], active_rect[3], 0.1]);
}

// Assembly placement for mesh_export.py — one ECHO line per part, mm.
// `openscad -o /dev/null -D print_placement=true assembly.scad`
module echo_placement(explode = 0) {
    echo(place = ["backlight", 0, 0, 0]);
    echo(place = ["panel", 0, 0, panel_z + explode * 0.5]);
    echo(place = ["backlight_web", 0, 0, panel_z + panel_t + explode]);
    echo(place = ["acrylic_face", 0, 0, face_rebate_z + explode * 1.6]);
    // Buttons: local origin bottom-left; placed cap-down onto the mask.
    bz = tray_h + explode * 2.4;
    echo(place = ["button_rocker", btn_minus_c[0] - btn_d_mm / 2, btn_minus_c[1] - btn_d_mm / 2, bz]);
    echo(place = ["button_sel", btn_sel_c[0] - oval_w_mm / 2, btn_sel_c[1] - oval_h_mm / 2, bz]);
    echo(place = ["button_trip", btn_trip_c[0] - oval_w_mm / 2, btn_trip_c[1] - oval_h_mm / 2, bz]);
    echo(panel_box = [panel_rect[0], panel_rect[1], panel_rect[2], panel_rect[3], panel_t]);
}

module assembly(explode = 0) {
    // F5 preview only. Not a printable mesh.
    color([0.22, 0.22, 0.24]) backlight();
    color([0.12, 0.14, 0.18])
        translate([0, 0, panel_z + explode * 0.5]) panel_placeholder();
    color([0.55, 0.52, 0.48])
        translate([0, 0, panel_z + panel_t + explode]) backlight_web();
    color([0.82, 0.80, 0.74, 0.55])
        translate([0, 0, face_rebate_z + explode * 1.6]) acrylic_face();
    color([0.12, 0.12, 0.12])
        translate([0, 0, tray_h + explode * 2.4]) rubber_buttons_placed();
}
// main file
// =============================================================================
// PLACEHOLDER — rubber buttons (Option 1 replace-face)
// =============================================================================
// −/+ PUSH CANCEL rocker, SEL oval, TRIP oval.
// Zones follow refs/flat/DIMENSIONS.md percentages. Callipers UNKNOWN.
// NOT OEM rubber and NOT a verified AP1 drop-in.
//
// F5 plate preview only. Export button_rocker / button_sel / button_trip
// as separate solids (one solid per STL).
//
// Print in TPU 95A, or print a master and cast silicone.
// Do NOT use PLA. Cabin-facing hard parts around these stay PETG / ASA.
// =============================================================================

include <parts.scad>
rubber_buttons_print();
